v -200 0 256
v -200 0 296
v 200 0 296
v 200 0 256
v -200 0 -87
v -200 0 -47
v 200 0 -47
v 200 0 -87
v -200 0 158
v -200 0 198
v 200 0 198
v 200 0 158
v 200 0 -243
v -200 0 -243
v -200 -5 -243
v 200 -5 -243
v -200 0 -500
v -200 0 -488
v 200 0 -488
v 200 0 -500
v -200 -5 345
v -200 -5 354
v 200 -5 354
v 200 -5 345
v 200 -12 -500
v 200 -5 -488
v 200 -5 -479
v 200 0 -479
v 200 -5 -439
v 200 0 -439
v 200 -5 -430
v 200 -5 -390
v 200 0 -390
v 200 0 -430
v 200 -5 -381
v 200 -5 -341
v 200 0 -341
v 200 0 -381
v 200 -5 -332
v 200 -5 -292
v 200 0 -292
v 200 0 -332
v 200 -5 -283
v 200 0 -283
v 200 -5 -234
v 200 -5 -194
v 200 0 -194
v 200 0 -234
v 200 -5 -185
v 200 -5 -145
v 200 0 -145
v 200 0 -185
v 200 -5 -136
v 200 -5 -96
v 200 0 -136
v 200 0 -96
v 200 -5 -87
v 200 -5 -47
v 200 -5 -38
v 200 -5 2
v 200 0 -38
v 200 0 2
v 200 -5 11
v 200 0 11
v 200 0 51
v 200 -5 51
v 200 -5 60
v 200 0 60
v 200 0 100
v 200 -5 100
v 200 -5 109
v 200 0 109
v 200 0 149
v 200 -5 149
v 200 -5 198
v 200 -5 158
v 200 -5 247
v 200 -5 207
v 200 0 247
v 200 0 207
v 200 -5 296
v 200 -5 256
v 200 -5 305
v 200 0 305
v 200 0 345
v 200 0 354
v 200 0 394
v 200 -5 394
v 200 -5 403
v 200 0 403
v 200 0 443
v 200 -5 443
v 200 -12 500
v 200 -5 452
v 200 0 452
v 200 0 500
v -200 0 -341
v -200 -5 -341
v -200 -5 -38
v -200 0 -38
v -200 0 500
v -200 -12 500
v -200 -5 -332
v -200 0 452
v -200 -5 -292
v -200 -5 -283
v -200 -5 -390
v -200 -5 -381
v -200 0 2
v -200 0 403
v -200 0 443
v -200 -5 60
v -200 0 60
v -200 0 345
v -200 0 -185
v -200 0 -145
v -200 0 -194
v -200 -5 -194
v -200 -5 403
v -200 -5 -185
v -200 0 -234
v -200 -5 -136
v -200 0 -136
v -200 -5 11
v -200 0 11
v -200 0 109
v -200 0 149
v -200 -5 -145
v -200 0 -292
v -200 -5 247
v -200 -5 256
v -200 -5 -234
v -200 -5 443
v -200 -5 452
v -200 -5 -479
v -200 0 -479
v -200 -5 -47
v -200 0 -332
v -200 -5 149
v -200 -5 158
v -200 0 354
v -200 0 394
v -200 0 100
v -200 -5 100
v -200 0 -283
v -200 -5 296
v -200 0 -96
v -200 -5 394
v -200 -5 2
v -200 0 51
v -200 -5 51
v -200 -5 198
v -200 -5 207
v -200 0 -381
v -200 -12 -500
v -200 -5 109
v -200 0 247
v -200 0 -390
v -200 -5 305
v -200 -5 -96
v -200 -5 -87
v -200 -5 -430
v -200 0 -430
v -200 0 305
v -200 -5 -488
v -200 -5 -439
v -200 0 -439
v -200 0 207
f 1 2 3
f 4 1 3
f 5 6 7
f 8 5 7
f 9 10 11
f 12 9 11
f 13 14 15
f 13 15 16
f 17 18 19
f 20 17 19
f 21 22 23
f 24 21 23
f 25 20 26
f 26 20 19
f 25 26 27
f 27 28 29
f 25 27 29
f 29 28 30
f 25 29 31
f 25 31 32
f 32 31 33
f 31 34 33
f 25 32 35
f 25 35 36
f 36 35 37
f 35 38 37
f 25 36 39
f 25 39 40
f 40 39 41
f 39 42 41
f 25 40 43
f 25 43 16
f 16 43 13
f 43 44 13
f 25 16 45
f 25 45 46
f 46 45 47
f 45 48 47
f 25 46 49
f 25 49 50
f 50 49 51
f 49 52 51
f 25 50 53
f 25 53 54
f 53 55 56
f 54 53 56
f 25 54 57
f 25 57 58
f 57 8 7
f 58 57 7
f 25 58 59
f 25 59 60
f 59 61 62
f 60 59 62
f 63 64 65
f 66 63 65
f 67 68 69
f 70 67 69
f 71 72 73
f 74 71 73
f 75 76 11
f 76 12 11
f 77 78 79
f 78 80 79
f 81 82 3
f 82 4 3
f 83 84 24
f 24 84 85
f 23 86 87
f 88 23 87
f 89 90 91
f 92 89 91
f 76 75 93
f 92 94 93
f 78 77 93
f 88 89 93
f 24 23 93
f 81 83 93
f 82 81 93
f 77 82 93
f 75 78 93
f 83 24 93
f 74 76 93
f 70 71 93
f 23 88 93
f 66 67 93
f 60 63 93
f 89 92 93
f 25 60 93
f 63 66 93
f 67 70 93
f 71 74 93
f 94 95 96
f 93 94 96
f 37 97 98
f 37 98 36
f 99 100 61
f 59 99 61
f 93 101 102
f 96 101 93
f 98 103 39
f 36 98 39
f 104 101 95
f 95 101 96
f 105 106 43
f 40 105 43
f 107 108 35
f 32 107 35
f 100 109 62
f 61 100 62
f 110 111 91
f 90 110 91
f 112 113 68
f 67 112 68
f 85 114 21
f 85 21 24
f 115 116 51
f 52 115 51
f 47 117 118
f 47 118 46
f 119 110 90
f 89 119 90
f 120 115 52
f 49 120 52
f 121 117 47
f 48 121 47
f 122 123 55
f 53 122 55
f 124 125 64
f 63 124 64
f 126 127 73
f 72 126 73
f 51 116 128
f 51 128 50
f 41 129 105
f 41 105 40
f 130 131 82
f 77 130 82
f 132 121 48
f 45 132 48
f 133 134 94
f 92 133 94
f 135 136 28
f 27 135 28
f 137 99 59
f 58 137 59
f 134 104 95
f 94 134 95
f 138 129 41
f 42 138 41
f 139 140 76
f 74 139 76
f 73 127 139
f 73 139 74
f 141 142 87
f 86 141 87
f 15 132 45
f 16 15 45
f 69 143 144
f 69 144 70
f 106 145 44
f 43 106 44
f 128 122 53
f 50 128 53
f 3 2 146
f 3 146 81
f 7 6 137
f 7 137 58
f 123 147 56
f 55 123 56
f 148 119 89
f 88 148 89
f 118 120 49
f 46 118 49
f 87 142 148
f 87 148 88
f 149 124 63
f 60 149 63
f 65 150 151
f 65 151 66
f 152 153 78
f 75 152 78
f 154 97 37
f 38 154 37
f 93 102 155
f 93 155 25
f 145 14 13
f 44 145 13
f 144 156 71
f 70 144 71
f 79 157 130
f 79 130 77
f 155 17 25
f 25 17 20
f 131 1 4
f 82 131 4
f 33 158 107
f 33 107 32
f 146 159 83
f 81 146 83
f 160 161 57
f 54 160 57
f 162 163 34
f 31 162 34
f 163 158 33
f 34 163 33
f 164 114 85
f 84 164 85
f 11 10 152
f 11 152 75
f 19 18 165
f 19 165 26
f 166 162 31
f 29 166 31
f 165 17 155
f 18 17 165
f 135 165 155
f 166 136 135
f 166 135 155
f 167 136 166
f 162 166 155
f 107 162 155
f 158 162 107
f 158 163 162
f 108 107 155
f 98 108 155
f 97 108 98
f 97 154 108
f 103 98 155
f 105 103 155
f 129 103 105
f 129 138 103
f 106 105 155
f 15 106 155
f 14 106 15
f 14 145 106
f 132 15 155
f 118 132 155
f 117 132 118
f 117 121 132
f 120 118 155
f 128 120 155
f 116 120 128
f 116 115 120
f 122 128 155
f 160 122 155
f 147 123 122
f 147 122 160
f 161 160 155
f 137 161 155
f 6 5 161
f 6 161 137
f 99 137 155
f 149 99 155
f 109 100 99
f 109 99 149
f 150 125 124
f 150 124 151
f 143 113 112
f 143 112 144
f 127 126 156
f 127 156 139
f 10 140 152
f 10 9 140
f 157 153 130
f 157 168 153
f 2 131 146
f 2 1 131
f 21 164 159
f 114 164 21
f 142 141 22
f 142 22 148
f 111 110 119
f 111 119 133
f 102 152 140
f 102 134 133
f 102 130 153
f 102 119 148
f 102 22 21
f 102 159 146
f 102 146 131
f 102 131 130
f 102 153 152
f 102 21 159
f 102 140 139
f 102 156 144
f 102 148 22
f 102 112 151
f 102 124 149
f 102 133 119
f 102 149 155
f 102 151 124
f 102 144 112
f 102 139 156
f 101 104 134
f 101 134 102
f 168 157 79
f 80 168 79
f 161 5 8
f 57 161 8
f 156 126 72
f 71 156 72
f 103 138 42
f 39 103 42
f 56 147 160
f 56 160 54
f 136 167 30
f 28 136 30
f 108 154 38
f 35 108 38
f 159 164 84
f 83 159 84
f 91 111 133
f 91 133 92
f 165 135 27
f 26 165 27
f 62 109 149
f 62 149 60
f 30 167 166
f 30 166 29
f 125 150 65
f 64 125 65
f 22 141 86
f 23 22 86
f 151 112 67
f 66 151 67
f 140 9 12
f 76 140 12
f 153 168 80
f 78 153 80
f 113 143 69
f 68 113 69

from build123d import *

# Parameters (mm, degrees)
F0_W     = 400
F0_H     = 1000
F2_DEPTH = 12
F1_W     = 400
F1_H     = 9
F3_DEPTH = 5


with BuildPart() as f2:
    # F0 (on Front) → F2 (new body)
    with BuildSketch(Plane.XZ):
        Rectangle(F0_W, F0_H)
    extrude(amount=F2_DEPTH)

    # F1 (on face) → F3 (cut)
    with BuildSketch(Plane.XZ):
        with Locations((0, -483.5)):
            Rectangle(F1_W, F1_H)
        with Locations((0, -434.5)):
            Rectangle(F1_W, F1_H)
        with Locations((0, -385.5)):
            Rectangle(F1_W, F1_H)
        with Locations((0, -336.5)):
            Rectangle(F1_W, F1_H)
        with Locations((0, -287.5)):
            Rectangle(F1_W, F1_H)
        with Locations((0, -238.5)):
            Rectangle(F1_W, F1_H)
        with Locations((0, -189.5)):
            Rectangle(F1_W, F1_H)
        with Locations((0, -140.5)):
            Rectangle(F1_W, F1_H)
        with Locations((0, -91.5)):
            Rectangle(F1_W, F1_H)
        with Locations((0, -42.5)):
            Rectangle(F1_W, F1_H)
        with Locations((0, 6.5)):
            Rectangle(F1_W, F1_H)
        with Locations((0, 55.5)):
            Rectangle(F1_W, F1_H)
        with Locations((0, 104.5)):
            Rectangle(F1_W, F1_H)
        with Locations((0, 153.5)):
            Rectangle(F1_W, F1_H)
        with Locations((0, 202.5)):
            Rectangle(F1_W, F1_H)
        with Locations((0, 251.5)):
            Rectangle(F1_W, F1_H)
        with Locations((0, 300.5)):
            Rectangle(F1_W, F1_H)
        with Locations((0, 349.5)):
            Rectangle(F1_W, F1_H)
        with Locations((0, 398.5)):
            Rectangle(F1_W, F1_H)
        with Locations((0, 447.5)):
            Rectangle(F1_W, F1_H)
    extrude(amount=F3_DEPTH, mode=Mode.SUBTRACT)


solid = f2.part
